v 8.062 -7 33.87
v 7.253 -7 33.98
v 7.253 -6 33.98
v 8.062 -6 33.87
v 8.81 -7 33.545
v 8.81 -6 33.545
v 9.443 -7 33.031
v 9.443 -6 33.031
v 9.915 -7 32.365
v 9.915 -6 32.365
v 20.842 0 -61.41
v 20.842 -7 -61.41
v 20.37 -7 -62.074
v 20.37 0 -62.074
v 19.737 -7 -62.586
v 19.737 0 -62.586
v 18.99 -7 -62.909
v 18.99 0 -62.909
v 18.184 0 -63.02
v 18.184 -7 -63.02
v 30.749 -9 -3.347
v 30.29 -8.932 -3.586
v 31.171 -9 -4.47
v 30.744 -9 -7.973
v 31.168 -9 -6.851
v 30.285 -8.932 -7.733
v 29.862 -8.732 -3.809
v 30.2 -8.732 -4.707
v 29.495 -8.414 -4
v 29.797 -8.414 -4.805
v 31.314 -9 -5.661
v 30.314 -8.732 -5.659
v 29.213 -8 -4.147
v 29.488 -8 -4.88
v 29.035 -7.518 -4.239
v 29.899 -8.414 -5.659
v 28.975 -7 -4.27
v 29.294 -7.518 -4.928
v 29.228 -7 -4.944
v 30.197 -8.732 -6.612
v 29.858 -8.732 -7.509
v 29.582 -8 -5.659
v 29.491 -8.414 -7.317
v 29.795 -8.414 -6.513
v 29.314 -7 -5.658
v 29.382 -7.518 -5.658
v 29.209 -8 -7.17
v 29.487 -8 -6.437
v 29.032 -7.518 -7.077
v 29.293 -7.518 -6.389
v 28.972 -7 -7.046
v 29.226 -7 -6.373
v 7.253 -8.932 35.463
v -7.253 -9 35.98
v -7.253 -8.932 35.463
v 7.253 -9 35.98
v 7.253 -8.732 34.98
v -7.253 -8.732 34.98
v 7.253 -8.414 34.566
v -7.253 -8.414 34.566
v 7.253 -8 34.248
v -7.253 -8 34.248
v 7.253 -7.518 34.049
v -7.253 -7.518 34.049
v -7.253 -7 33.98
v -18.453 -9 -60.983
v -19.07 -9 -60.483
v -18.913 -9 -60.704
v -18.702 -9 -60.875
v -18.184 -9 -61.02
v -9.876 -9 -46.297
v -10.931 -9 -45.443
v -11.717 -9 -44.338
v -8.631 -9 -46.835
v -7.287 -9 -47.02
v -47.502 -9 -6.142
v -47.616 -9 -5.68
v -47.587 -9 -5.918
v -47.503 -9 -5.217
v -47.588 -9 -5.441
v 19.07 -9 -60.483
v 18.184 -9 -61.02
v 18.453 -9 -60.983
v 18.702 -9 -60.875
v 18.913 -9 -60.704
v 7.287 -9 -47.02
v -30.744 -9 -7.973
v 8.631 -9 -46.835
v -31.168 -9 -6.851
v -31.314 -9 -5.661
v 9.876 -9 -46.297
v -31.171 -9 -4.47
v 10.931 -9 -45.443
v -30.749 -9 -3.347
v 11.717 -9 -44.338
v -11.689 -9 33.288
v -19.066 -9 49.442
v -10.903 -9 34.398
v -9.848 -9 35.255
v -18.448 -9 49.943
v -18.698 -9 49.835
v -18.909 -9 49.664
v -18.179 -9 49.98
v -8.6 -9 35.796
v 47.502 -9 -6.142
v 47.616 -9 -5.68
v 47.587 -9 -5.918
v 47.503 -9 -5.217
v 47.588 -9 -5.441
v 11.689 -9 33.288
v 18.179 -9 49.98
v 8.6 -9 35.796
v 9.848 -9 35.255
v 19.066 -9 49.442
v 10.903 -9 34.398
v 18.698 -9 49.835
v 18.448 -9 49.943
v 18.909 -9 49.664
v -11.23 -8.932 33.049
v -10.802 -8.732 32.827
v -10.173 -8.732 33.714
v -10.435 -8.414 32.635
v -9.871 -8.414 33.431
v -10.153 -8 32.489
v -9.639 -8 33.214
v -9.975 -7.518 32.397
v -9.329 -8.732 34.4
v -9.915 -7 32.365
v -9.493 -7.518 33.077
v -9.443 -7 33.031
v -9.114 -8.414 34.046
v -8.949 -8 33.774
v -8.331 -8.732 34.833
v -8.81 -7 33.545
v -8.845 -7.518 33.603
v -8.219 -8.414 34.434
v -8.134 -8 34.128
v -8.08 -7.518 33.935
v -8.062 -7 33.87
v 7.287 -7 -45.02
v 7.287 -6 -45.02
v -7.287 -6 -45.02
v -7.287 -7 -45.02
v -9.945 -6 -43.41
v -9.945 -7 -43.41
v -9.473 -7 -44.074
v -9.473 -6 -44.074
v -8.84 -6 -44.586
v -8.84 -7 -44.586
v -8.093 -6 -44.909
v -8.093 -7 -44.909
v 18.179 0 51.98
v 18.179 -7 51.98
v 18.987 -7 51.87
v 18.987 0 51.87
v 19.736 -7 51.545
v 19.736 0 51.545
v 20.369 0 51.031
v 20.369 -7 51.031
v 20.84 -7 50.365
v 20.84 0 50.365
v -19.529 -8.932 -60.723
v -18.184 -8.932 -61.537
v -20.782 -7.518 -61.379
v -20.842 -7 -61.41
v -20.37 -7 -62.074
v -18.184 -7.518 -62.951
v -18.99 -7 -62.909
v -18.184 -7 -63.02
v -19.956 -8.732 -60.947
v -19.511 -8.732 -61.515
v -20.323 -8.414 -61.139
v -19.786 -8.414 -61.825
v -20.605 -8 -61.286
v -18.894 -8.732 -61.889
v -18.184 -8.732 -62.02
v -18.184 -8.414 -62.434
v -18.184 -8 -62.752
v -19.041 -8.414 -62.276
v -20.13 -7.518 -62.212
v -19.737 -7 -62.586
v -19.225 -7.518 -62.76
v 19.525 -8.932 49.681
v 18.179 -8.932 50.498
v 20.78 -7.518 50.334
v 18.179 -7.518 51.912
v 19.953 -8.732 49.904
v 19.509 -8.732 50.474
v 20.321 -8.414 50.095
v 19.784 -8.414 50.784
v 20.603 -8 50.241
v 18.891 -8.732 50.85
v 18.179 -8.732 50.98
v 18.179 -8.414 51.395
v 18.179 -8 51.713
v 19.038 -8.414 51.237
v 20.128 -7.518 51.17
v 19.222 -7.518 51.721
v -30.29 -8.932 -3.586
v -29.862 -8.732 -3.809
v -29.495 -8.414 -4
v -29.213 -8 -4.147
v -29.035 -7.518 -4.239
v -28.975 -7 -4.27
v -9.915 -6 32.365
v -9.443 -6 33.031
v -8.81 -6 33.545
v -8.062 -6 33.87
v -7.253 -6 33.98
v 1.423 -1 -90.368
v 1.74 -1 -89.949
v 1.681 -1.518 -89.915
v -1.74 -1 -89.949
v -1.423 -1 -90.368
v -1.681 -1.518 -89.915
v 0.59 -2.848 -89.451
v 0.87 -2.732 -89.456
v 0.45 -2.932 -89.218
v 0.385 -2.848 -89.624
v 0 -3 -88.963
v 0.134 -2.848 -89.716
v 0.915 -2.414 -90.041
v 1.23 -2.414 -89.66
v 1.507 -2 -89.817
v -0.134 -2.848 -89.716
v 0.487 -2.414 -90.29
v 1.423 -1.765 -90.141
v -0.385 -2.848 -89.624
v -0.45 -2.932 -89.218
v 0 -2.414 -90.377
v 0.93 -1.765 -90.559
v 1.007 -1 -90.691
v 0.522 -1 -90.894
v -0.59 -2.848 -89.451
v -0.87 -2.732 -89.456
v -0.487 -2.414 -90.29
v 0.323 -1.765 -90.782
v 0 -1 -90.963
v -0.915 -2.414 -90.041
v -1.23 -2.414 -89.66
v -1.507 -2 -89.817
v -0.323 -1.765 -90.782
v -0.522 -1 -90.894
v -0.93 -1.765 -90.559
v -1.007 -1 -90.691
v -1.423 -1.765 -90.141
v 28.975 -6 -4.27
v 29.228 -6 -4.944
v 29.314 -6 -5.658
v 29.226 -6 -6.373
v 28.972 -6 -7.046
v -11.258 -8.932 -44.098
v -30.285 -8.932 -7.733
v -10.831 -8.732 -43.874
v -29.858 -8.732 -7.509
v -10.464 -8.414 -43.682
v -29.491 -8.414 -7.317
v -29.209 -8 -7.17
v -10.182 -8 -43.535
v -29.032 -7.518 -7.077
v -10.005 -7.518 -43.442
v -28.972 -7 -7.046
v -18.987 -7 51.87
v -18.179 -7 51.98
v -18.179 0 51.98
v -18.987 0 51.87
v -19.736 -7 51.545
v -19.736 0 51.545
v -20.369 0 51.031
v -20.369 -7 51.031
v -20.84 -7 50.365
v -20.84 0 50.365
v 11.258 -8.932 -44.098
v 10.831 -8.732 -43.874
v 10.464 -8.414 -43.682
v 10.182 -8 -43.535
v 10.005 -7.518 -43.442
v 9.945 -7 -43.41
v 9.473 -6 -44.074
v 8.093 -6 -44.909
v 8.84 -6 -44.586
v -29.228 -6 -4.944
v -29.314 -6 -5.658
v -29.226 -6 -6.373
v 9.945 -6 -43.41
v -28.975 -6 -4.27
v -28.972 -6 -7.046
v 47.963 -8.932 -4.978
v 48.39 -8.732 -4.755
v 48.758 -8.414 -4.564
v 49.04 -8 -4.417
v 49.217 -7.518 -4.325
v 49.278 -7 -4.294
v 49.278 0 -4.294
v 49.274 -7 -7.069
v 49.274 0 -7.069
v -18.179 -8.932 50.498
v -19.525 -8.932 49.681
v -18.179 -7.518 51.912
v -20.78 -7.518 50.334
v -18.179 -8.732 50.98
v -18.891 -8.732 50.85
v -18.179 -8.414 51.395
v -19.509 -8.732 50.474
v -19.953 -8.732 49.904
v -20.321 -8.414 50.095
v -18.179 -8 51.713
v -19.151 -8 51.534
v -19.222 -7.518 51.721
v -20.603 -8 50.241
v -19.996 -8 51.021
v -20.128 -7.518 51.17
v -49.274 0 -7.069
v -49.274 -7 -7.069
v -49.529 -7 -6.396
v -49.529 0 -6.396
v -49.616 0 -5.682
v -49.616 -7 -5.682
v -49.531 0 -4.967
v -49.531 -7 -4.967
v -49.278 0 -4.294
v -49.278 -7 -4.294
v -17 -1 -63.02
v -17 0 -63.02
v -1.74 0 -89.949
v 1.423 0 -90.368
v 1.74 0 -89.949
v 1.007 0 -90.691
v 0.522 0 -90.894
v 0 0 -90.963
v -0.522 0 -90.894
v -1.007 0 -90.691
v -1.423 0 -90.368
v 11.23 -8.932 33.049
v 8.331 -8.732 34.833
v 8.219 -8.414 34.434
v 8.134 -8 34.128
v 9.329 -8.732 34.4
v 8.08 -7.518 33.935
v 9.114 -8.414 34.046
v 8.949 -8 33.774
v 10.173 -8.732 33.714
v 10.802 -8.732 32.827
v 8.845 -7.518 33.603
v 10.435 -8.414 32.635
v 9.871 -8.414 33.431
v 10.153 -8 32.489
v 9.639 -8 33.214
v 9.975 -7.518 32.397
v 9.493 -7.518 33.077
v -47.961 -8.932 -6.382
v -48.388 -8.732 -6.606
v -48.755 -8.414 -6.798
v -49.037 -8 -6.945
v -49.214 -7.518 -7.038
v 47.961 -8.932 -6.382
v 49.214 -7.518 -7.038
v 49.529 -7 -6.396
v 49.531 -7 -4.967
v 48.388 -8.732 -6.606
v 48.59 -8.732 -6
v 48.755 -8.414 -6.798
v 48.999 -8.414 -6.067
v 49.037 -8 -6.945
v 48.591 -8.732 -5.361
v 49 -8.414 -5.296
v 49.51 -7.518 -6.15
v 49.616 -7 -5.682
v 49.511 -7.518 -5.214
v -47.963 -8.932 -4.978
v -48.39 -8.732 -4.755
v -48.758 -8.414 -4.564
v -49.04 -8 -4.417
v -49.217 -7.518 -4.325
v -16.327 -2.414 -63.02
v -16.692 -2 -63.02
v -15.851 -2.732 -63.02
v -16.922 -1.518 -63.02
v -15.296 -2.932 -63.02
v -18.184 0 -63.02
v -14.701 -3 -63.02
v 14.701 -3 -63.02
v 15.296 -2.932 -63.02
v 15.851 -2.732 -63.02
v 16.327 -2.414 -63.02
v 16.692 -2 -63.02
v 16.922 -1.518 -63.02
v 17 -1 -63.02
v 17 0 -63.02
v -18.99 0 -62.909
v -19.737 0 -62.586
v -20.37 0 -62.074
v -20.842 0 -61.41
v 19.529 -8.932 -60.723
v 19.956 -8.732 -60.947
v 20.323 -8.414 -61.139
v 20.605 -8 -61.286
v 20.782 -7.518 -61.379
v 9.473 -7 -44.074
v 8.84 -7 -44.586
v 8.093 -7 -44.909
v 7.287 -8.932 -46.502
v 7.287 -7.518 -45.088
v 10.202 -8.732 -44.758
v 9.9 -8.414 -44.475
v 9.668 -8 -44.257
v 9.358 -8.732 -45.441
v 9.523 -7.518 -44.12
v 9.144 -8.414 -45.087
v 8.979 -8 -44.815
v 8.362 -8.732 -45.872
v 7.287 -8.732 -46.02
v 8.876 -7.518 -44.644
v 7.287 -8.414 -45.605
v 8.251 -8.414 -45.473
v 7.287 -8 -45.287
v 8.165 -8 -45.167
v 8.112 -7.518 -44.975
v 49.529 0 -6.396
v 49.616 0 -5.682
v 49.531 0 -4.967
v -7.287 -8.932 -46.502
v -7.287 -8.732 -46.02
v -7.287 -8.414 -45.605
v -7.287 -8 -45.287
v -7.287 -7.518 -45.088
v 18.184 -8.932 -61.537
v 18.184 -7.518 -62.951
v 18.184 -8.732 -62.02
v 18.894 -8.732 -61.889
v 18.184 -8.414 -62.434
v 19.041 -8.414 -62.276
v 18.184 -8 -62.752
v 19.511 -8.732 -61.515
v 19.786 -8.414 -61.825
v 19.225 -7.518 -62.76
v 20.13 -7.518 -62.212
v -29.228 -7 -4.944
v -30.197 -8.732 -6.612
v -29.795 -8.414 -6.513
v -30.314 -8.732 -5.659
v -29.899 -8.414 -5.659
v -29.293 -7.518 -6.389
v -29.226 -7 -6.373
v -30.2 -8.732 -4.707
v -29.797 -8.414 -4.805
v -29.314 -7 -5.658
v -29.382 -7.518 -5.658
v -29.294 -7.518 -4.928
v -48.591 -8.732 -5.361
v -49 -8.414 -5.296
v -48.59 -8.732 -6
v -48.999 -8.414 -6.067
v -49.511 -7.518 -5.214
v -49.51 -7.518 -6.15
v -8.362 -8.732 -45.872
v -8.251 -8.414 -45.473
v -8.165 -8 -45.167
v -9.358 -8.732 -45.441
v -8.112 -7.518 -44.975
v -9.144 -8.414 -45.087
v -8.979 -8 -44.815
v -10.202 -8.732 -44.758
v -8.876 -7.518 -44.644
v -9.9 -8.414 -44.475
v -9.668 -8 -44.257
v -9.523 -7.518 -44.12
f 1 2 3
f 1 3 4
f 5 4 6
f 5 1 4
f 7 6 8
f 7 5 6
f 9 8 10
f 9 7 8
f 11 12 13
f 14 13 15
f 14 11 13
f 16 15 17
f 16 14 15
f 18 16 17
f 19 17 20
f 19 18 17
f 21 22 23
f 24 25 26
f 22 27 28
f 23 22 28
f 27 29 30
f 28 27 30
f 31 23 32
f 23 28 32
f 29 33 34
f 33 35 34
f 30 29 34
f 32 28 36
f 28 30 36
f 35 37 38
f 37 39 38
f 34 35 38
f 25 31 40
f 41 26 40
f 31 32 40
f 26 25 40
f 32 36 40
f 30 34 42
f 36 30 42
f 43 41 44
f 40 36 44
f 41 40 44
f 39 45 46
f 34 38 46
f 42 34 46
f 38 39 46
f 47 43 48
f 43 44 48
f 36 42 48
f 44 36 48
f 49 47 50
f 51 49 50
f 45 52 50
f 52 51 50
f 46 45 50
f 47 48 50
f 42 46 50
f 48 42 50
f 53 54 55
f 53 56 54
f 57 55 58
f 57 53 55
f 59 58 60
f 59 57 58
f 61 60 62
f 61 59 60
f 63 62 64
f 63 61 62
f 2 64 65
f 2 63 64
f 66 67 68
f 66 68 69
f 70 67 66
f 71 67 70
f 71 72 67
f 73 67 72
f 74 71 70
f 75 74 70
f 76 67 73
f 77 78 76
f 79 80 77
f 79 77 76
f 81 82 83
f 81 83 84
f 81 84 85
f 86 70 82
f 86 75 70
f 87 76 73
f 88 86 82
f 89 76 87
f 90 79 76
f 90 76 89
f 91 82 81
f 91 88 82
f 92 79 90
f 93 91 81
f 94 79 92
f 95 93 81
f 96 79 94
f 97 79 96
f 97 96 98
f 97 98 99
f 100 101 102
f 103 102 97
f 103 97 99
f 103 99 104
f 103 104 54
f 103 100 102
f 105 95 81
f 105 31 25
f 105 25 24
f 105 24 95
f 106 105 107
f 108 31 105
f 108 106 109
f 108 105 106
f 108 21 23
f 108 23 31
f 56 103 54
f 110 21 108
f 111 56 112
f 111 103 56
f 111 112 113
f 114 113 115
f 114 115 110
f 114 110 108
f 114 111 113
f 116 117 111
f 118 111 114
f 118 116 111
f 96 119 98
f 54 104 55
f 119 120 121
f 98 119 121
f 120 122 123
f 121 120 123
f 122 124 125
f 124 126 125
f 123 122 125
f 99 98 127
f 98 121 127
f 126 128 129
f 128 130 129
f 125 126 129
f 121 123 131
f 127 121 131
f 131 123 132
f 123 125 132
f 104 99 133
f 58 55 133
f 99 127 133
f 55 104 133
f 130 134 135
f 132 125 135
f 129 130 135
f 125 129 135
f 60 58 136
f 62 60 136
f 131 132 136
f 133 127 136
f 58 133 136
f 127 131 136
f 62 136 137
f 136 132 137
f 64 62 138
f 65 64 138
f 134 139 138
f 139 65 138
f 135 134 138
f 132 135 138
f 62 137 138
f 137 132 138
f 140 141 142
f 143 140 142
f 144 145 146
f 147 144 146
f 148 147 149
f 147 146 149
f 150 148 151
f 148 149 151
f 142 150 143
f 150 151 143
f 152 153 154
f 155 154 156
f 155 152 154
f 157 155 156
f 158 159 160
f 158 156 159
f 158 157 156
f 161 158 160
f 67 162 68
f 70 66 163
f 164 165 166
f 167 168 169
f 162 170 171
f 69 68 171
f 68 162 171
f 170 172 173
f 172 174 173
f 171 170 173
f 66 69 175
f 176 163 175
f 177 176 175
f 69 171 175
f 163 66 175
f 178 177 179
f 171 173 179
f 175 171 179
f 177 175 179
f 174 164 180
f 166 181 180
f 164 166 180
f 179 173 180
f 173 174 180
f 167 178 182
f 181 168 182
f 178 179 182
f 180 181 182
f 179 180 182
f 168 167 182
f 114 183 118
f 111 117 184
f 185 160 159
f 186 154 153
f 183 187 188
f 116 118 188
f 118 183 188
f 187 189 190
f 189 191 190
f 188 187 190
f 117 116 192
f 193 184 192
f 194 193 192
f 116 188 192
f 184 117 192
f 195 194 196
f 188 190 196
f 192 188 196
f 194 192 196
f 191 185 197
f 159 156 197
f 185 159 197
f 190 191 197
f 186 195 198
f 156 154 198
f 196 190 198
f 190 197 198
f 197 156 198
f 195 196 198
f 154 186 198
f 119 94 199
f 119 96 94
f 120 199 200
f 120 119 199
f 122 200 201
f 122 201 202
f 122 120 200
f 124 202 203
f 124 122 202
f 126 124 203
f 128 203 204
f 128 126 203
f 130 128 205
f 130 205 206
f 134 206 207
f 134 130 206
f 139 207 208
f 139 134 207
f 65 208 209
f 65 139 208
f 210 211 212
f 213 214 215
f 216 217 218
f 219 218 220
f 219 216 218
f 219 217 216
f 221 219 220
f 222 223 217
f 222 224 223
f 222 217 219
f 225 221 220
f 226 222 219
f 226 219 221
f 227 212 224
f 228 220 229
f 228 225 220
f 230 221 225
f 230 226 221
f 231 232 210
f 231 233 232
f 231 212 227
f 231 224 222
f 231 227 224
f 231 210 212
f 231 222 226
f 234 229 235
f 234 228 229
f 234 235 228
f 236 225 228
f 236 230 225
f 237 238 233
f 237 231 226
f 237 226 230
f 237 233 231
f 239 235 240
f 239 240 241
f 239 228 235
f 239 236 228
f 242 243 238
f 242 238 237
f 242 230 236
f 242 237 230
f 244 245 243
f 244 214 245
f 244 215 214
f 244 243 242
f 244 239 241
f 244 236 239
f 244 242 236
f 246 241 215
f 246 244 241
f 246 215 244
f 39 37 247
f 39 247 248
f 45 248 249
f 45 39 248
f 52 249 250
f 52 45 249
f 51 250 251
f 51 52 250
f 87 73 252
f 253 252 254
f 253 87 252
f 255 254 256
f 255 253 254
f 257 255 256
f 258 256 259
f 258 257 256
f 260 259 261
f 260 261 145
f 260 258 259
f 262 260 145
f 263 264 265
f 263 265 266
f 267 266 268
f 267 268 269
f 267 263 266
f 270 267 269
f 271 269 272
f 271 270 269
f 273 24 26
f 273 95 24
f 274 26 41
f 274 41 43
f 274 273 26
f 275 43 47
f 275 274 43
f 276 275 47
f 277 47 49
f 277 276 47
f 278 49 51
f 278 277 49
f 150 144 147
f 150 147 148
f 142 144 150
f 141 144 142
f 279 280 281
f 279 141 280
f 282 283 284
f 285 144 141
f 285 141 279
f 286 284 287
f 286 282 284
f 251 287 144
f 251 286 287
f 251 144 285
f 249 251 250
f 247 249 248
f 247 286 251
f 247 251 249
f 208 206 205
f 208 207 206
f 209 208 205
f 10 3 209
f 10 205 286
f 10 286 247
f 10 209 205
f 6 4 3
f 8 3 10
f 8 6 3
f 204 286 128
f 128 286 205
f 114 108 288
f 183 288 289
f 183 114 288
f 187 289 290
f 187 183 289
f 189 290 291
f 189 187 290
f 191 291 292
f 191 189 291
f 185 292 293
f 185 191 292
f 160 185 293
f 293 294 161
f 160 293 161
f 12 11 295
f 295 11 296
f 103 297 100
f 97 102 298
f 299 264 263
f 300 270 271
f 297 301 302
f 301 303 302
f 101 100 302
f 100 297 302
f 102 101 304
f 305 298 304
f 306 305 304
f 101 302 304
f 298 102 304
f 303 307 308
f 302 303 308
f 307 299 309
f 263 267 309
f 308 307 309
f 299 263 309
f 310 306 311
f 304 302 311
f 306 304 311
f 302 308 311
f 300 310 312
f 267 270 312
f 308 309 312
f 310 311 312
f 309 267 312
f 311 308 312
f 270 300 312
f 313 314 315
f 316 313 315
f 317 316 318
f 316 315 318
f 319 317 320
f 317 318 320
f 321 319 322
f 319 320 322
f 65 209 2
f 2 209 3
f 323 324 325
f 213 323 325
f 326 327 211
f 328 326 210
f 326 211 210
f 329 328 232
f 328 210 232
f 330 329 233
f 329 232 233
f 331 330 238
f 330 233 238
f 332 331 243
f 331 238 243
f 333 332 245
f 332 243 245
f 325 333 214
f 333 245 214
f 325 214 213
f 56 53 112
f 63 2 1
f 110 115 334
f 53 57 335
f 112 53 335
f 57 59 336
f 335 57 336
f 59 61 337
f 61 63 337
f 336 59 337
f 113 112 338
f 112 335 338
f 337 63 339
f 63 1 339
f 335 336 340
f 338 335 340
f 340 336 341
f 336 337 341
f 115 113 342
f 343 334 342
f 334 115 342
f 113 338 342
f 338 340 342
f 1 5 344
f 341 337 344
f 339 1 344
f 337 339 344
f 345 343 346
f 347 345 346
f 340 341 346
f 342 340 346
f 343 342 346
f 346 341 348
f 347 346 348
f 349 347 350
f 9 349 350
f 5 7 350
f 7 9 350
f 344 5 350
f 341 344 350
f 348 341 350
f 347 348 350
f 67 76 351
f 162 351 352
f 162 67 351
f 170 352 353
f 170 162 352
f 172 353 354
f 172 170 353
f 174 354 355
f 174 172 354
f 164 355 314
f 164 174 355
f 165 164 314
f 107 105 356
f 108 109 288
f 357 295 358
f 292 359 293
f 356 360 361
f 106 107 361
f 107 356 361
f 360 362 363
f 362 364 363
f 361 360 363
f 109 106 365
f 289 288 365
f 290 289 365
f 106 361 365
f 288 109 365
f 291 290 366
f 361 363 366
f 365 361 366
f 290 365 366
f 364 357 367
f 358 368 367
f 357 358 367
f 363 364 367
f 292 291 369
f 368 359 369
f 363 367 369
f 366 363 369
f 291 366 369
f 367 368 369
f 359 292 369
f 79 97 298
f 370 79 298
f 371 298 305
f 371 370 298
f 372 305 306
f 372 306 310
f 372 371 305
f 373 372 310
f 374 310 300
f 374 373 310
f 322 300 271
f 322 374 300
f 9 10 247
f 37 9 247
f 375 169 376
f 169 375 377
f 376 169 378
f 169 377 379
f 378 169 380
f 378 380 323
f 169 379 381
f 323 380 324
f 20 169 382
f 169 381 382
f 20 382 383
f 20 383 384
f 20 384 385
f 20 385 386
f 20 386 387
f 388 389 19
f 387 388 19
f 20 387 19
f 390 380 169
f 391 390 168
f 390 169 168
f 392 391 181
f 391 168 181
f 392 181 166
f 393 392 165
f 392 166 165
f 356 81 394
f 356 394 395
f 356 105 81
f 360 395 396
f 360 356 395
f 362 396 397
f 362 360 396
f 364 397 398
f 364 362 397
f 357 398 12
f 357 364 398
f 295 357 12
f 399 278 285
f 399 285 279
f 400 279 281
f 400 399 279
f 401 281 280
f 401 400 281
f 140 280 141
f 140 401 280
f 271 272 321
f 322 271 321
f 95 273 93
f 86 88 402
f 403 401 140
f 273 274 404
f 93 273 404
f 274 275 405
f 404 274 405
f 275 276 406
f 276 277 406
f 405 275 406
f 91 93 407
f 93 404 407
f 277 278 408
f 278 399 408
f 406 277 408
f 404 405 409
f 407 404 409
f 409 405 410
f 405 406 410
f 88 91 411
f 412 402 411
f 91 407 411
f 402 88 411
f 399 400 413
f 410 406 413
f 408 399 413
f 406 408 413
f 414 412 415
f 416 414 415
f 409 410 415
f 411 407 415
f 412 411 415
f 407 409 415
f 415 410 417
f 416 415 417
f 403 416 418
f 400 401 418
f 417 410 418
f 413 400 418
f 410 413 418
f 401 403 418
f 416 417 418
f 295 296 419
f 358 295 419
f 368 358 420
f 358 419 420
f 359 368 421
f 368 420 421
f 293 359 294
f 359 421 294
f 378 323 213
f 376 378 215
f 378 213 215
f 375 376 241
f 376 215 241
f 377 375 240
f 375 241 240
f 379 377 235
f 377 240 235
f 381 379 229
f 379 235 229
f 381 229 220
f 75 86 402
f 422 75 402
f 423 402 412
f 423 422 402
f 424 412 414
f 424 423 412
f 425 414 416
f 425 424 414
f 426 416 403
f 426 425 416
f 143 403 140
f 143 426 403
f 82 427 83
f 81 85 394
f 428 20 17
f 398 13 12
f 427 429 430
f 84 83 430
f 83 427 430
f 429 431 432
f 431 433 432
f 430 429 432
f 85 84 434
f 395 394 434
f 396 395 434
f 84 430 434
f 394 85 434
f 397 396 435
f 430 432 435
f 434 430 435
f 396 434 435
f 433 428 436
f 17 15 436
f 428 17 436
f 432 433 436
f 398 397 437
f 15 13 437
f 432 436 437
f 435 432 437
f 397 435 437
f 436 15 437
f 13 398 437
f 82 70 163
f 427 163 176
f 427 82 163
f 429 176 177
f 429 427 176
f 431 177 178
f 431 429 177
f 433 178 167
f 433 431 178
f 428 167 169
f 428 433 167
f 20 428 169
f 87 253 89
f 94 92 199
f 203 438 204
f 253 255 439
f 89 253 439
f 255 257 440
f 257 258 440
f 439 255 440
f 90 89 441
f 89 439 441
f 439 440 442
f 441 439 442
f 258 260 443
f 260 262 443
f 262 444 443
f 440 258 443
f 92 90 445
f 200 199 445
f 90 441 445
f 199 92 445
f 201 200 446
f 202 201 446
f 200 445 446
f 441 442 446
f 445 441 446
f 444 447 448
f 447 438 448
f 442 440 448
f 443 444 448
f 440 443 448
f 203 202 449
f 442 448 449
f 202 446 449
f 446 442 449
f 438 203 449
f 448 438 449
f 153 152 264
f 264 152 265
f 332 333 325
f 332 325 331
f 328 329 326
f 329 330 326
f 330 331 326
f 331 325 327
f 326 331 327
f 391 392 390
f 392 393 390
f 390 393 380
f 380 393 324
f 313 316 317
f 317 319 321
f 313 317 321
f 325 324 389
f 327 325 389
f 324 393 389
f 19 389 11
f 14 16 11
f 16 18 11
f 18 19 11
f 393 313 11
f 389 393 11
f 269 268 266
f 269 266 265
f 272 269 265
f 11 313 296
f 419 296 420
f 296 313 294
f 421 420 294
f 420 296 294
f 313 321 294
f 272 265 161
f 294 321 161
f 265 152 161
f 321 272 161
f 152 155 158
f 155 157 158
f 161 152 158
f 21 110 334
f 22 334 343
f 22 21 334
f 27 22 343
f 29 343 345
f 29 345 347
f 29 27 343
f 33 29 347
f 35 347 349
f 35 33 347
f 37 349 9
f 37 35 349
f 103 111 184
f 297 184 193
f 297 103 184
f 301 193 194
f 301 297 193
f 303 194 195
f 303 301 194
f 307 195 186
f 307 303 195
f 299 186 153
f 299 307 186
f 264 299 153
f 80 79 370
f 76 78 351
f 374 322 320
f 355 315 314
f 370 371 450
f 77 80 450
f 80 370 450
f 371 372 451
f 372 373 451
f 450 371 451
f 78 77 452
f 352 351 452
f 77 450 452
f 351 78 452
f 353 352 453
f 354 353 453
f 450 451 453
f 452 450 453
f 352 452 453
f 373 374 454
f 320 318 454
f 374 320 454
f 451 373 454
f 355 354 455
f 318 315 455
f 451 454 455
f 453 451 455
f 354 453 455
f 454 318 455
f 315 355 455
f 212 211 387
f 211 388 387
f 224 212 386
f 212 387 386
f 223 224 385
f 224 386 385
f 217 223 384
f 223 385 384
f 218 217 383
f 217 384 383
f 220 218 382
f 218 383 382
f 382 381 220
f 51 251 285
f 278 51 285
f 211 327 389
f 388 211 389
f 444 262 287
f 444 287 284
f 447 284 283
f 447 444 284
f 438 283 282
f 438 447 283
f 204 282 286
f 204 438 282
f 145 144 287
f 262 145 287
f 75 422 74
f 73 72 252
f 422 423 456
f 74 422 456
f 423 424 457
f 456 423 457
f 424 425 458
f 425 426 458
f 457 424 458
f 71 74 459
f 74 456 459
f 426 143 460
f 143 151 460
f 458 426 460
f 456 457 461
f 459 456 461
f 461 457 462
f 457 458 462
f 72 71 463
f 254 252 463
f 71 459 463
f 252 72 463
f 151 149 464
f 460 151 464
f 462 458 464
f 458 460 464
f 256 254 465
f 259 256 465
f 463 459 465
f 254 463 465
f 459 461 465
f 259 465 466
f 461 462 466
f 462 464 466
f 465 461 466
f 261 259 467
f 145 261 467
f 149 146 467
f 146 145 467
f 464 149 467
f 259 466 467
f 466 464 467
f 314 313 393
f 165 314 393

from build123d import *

# Parameters (mm, degrees)
F1_DEPTH = 3
F3_DEPTH = 3
F5_DEPTH = 3
F6_R     = 3
F7_R     = 2


with BuildPart() as f1:
    # F0 (on Front) → F1 (new body)
    with BuildSketch(Plane.XZ):
        Polygon((20, 51.98047), (0, 51.98047), (-20, 51.98047), (-50, -5.682343), (-20, -63.01953), (-17, -63.01953), (0, -63.01953), (17, -63.01953), (20, -63.01953), (50, -5.682343), align=None)
        Polygon((0, -93.01953), (17, -63.01953), (0, -63.01953), (-17, -63.01953), align=None)
    extrude(amount=F1_DEPTH)

    # F2 (on face) → F3 (join)
    with BuildSketch(Plane.XZ.offset(3)):
        Polygon((20, 51.98047), (-20, 51.98047), (-50, -5.682343), (-20, -63.01953), (20, -63.01953), (50, -5.682343), align=None)
    extrude(amount=F3_DEPTH)

    # F4 (on face) → F5 (join)
    with BuildSketch(Plane.XZ.offset(6)):
        Polygon((20, 51.98047), (-20, 51.98047), (-50, -5.682343), (-20, -63.01953), (20, -63.01953), (50, -5.682343), align=None)
        Polygon((-9.102997, -45.01953), (-29.697361, -5.658767), (-9.074414, 33.98047), (9.074414, 33.98047), (29.697361, -5.658767), (9.102997, -45.01953), align=None, mode=Mode.SUBTRACT)
    extrude(amount=F5_DEPTH)

    # F6
    f6_edges = [f1.edges().sort_by_distance(p)[0] for p in [
        (-20, -4.5, 51.98047),
        (20, -4.5, 51.98047),
        (-50, -4.5, -5.682343),
        (-20, -4.5, -63.01953),
        (20, -4.5, -63.01953),
        (50, -4.5, -5.682343),
        (9.074414, -7.5, 33.98047),
        (29.697361, -7.5, -5.658767),
        (-9.074414, -7.5, 33.98047),
        (-29.697361, -7.5, -5.658767),
        (-9.102997, -7.5, -45.01953),
        (9.102997, -7.5, -45.01953),
    ]]
    fillet(f6_edges, radius=F6_R)

    # F7
    f7_edges = [f1.edges().sort_by_distance(p)[0] for p in [
        (-35.059009, -9, 23.035643),
        (-19.444896, -9, 14.047431),
        (8.5, -3, -78.01953),
        (-8.5, -3, -78.01953),
        (0, -1.5, -93.01953),
    ]]
    fillet(f7_edges, radius=F7_R)


solid = f1.part
